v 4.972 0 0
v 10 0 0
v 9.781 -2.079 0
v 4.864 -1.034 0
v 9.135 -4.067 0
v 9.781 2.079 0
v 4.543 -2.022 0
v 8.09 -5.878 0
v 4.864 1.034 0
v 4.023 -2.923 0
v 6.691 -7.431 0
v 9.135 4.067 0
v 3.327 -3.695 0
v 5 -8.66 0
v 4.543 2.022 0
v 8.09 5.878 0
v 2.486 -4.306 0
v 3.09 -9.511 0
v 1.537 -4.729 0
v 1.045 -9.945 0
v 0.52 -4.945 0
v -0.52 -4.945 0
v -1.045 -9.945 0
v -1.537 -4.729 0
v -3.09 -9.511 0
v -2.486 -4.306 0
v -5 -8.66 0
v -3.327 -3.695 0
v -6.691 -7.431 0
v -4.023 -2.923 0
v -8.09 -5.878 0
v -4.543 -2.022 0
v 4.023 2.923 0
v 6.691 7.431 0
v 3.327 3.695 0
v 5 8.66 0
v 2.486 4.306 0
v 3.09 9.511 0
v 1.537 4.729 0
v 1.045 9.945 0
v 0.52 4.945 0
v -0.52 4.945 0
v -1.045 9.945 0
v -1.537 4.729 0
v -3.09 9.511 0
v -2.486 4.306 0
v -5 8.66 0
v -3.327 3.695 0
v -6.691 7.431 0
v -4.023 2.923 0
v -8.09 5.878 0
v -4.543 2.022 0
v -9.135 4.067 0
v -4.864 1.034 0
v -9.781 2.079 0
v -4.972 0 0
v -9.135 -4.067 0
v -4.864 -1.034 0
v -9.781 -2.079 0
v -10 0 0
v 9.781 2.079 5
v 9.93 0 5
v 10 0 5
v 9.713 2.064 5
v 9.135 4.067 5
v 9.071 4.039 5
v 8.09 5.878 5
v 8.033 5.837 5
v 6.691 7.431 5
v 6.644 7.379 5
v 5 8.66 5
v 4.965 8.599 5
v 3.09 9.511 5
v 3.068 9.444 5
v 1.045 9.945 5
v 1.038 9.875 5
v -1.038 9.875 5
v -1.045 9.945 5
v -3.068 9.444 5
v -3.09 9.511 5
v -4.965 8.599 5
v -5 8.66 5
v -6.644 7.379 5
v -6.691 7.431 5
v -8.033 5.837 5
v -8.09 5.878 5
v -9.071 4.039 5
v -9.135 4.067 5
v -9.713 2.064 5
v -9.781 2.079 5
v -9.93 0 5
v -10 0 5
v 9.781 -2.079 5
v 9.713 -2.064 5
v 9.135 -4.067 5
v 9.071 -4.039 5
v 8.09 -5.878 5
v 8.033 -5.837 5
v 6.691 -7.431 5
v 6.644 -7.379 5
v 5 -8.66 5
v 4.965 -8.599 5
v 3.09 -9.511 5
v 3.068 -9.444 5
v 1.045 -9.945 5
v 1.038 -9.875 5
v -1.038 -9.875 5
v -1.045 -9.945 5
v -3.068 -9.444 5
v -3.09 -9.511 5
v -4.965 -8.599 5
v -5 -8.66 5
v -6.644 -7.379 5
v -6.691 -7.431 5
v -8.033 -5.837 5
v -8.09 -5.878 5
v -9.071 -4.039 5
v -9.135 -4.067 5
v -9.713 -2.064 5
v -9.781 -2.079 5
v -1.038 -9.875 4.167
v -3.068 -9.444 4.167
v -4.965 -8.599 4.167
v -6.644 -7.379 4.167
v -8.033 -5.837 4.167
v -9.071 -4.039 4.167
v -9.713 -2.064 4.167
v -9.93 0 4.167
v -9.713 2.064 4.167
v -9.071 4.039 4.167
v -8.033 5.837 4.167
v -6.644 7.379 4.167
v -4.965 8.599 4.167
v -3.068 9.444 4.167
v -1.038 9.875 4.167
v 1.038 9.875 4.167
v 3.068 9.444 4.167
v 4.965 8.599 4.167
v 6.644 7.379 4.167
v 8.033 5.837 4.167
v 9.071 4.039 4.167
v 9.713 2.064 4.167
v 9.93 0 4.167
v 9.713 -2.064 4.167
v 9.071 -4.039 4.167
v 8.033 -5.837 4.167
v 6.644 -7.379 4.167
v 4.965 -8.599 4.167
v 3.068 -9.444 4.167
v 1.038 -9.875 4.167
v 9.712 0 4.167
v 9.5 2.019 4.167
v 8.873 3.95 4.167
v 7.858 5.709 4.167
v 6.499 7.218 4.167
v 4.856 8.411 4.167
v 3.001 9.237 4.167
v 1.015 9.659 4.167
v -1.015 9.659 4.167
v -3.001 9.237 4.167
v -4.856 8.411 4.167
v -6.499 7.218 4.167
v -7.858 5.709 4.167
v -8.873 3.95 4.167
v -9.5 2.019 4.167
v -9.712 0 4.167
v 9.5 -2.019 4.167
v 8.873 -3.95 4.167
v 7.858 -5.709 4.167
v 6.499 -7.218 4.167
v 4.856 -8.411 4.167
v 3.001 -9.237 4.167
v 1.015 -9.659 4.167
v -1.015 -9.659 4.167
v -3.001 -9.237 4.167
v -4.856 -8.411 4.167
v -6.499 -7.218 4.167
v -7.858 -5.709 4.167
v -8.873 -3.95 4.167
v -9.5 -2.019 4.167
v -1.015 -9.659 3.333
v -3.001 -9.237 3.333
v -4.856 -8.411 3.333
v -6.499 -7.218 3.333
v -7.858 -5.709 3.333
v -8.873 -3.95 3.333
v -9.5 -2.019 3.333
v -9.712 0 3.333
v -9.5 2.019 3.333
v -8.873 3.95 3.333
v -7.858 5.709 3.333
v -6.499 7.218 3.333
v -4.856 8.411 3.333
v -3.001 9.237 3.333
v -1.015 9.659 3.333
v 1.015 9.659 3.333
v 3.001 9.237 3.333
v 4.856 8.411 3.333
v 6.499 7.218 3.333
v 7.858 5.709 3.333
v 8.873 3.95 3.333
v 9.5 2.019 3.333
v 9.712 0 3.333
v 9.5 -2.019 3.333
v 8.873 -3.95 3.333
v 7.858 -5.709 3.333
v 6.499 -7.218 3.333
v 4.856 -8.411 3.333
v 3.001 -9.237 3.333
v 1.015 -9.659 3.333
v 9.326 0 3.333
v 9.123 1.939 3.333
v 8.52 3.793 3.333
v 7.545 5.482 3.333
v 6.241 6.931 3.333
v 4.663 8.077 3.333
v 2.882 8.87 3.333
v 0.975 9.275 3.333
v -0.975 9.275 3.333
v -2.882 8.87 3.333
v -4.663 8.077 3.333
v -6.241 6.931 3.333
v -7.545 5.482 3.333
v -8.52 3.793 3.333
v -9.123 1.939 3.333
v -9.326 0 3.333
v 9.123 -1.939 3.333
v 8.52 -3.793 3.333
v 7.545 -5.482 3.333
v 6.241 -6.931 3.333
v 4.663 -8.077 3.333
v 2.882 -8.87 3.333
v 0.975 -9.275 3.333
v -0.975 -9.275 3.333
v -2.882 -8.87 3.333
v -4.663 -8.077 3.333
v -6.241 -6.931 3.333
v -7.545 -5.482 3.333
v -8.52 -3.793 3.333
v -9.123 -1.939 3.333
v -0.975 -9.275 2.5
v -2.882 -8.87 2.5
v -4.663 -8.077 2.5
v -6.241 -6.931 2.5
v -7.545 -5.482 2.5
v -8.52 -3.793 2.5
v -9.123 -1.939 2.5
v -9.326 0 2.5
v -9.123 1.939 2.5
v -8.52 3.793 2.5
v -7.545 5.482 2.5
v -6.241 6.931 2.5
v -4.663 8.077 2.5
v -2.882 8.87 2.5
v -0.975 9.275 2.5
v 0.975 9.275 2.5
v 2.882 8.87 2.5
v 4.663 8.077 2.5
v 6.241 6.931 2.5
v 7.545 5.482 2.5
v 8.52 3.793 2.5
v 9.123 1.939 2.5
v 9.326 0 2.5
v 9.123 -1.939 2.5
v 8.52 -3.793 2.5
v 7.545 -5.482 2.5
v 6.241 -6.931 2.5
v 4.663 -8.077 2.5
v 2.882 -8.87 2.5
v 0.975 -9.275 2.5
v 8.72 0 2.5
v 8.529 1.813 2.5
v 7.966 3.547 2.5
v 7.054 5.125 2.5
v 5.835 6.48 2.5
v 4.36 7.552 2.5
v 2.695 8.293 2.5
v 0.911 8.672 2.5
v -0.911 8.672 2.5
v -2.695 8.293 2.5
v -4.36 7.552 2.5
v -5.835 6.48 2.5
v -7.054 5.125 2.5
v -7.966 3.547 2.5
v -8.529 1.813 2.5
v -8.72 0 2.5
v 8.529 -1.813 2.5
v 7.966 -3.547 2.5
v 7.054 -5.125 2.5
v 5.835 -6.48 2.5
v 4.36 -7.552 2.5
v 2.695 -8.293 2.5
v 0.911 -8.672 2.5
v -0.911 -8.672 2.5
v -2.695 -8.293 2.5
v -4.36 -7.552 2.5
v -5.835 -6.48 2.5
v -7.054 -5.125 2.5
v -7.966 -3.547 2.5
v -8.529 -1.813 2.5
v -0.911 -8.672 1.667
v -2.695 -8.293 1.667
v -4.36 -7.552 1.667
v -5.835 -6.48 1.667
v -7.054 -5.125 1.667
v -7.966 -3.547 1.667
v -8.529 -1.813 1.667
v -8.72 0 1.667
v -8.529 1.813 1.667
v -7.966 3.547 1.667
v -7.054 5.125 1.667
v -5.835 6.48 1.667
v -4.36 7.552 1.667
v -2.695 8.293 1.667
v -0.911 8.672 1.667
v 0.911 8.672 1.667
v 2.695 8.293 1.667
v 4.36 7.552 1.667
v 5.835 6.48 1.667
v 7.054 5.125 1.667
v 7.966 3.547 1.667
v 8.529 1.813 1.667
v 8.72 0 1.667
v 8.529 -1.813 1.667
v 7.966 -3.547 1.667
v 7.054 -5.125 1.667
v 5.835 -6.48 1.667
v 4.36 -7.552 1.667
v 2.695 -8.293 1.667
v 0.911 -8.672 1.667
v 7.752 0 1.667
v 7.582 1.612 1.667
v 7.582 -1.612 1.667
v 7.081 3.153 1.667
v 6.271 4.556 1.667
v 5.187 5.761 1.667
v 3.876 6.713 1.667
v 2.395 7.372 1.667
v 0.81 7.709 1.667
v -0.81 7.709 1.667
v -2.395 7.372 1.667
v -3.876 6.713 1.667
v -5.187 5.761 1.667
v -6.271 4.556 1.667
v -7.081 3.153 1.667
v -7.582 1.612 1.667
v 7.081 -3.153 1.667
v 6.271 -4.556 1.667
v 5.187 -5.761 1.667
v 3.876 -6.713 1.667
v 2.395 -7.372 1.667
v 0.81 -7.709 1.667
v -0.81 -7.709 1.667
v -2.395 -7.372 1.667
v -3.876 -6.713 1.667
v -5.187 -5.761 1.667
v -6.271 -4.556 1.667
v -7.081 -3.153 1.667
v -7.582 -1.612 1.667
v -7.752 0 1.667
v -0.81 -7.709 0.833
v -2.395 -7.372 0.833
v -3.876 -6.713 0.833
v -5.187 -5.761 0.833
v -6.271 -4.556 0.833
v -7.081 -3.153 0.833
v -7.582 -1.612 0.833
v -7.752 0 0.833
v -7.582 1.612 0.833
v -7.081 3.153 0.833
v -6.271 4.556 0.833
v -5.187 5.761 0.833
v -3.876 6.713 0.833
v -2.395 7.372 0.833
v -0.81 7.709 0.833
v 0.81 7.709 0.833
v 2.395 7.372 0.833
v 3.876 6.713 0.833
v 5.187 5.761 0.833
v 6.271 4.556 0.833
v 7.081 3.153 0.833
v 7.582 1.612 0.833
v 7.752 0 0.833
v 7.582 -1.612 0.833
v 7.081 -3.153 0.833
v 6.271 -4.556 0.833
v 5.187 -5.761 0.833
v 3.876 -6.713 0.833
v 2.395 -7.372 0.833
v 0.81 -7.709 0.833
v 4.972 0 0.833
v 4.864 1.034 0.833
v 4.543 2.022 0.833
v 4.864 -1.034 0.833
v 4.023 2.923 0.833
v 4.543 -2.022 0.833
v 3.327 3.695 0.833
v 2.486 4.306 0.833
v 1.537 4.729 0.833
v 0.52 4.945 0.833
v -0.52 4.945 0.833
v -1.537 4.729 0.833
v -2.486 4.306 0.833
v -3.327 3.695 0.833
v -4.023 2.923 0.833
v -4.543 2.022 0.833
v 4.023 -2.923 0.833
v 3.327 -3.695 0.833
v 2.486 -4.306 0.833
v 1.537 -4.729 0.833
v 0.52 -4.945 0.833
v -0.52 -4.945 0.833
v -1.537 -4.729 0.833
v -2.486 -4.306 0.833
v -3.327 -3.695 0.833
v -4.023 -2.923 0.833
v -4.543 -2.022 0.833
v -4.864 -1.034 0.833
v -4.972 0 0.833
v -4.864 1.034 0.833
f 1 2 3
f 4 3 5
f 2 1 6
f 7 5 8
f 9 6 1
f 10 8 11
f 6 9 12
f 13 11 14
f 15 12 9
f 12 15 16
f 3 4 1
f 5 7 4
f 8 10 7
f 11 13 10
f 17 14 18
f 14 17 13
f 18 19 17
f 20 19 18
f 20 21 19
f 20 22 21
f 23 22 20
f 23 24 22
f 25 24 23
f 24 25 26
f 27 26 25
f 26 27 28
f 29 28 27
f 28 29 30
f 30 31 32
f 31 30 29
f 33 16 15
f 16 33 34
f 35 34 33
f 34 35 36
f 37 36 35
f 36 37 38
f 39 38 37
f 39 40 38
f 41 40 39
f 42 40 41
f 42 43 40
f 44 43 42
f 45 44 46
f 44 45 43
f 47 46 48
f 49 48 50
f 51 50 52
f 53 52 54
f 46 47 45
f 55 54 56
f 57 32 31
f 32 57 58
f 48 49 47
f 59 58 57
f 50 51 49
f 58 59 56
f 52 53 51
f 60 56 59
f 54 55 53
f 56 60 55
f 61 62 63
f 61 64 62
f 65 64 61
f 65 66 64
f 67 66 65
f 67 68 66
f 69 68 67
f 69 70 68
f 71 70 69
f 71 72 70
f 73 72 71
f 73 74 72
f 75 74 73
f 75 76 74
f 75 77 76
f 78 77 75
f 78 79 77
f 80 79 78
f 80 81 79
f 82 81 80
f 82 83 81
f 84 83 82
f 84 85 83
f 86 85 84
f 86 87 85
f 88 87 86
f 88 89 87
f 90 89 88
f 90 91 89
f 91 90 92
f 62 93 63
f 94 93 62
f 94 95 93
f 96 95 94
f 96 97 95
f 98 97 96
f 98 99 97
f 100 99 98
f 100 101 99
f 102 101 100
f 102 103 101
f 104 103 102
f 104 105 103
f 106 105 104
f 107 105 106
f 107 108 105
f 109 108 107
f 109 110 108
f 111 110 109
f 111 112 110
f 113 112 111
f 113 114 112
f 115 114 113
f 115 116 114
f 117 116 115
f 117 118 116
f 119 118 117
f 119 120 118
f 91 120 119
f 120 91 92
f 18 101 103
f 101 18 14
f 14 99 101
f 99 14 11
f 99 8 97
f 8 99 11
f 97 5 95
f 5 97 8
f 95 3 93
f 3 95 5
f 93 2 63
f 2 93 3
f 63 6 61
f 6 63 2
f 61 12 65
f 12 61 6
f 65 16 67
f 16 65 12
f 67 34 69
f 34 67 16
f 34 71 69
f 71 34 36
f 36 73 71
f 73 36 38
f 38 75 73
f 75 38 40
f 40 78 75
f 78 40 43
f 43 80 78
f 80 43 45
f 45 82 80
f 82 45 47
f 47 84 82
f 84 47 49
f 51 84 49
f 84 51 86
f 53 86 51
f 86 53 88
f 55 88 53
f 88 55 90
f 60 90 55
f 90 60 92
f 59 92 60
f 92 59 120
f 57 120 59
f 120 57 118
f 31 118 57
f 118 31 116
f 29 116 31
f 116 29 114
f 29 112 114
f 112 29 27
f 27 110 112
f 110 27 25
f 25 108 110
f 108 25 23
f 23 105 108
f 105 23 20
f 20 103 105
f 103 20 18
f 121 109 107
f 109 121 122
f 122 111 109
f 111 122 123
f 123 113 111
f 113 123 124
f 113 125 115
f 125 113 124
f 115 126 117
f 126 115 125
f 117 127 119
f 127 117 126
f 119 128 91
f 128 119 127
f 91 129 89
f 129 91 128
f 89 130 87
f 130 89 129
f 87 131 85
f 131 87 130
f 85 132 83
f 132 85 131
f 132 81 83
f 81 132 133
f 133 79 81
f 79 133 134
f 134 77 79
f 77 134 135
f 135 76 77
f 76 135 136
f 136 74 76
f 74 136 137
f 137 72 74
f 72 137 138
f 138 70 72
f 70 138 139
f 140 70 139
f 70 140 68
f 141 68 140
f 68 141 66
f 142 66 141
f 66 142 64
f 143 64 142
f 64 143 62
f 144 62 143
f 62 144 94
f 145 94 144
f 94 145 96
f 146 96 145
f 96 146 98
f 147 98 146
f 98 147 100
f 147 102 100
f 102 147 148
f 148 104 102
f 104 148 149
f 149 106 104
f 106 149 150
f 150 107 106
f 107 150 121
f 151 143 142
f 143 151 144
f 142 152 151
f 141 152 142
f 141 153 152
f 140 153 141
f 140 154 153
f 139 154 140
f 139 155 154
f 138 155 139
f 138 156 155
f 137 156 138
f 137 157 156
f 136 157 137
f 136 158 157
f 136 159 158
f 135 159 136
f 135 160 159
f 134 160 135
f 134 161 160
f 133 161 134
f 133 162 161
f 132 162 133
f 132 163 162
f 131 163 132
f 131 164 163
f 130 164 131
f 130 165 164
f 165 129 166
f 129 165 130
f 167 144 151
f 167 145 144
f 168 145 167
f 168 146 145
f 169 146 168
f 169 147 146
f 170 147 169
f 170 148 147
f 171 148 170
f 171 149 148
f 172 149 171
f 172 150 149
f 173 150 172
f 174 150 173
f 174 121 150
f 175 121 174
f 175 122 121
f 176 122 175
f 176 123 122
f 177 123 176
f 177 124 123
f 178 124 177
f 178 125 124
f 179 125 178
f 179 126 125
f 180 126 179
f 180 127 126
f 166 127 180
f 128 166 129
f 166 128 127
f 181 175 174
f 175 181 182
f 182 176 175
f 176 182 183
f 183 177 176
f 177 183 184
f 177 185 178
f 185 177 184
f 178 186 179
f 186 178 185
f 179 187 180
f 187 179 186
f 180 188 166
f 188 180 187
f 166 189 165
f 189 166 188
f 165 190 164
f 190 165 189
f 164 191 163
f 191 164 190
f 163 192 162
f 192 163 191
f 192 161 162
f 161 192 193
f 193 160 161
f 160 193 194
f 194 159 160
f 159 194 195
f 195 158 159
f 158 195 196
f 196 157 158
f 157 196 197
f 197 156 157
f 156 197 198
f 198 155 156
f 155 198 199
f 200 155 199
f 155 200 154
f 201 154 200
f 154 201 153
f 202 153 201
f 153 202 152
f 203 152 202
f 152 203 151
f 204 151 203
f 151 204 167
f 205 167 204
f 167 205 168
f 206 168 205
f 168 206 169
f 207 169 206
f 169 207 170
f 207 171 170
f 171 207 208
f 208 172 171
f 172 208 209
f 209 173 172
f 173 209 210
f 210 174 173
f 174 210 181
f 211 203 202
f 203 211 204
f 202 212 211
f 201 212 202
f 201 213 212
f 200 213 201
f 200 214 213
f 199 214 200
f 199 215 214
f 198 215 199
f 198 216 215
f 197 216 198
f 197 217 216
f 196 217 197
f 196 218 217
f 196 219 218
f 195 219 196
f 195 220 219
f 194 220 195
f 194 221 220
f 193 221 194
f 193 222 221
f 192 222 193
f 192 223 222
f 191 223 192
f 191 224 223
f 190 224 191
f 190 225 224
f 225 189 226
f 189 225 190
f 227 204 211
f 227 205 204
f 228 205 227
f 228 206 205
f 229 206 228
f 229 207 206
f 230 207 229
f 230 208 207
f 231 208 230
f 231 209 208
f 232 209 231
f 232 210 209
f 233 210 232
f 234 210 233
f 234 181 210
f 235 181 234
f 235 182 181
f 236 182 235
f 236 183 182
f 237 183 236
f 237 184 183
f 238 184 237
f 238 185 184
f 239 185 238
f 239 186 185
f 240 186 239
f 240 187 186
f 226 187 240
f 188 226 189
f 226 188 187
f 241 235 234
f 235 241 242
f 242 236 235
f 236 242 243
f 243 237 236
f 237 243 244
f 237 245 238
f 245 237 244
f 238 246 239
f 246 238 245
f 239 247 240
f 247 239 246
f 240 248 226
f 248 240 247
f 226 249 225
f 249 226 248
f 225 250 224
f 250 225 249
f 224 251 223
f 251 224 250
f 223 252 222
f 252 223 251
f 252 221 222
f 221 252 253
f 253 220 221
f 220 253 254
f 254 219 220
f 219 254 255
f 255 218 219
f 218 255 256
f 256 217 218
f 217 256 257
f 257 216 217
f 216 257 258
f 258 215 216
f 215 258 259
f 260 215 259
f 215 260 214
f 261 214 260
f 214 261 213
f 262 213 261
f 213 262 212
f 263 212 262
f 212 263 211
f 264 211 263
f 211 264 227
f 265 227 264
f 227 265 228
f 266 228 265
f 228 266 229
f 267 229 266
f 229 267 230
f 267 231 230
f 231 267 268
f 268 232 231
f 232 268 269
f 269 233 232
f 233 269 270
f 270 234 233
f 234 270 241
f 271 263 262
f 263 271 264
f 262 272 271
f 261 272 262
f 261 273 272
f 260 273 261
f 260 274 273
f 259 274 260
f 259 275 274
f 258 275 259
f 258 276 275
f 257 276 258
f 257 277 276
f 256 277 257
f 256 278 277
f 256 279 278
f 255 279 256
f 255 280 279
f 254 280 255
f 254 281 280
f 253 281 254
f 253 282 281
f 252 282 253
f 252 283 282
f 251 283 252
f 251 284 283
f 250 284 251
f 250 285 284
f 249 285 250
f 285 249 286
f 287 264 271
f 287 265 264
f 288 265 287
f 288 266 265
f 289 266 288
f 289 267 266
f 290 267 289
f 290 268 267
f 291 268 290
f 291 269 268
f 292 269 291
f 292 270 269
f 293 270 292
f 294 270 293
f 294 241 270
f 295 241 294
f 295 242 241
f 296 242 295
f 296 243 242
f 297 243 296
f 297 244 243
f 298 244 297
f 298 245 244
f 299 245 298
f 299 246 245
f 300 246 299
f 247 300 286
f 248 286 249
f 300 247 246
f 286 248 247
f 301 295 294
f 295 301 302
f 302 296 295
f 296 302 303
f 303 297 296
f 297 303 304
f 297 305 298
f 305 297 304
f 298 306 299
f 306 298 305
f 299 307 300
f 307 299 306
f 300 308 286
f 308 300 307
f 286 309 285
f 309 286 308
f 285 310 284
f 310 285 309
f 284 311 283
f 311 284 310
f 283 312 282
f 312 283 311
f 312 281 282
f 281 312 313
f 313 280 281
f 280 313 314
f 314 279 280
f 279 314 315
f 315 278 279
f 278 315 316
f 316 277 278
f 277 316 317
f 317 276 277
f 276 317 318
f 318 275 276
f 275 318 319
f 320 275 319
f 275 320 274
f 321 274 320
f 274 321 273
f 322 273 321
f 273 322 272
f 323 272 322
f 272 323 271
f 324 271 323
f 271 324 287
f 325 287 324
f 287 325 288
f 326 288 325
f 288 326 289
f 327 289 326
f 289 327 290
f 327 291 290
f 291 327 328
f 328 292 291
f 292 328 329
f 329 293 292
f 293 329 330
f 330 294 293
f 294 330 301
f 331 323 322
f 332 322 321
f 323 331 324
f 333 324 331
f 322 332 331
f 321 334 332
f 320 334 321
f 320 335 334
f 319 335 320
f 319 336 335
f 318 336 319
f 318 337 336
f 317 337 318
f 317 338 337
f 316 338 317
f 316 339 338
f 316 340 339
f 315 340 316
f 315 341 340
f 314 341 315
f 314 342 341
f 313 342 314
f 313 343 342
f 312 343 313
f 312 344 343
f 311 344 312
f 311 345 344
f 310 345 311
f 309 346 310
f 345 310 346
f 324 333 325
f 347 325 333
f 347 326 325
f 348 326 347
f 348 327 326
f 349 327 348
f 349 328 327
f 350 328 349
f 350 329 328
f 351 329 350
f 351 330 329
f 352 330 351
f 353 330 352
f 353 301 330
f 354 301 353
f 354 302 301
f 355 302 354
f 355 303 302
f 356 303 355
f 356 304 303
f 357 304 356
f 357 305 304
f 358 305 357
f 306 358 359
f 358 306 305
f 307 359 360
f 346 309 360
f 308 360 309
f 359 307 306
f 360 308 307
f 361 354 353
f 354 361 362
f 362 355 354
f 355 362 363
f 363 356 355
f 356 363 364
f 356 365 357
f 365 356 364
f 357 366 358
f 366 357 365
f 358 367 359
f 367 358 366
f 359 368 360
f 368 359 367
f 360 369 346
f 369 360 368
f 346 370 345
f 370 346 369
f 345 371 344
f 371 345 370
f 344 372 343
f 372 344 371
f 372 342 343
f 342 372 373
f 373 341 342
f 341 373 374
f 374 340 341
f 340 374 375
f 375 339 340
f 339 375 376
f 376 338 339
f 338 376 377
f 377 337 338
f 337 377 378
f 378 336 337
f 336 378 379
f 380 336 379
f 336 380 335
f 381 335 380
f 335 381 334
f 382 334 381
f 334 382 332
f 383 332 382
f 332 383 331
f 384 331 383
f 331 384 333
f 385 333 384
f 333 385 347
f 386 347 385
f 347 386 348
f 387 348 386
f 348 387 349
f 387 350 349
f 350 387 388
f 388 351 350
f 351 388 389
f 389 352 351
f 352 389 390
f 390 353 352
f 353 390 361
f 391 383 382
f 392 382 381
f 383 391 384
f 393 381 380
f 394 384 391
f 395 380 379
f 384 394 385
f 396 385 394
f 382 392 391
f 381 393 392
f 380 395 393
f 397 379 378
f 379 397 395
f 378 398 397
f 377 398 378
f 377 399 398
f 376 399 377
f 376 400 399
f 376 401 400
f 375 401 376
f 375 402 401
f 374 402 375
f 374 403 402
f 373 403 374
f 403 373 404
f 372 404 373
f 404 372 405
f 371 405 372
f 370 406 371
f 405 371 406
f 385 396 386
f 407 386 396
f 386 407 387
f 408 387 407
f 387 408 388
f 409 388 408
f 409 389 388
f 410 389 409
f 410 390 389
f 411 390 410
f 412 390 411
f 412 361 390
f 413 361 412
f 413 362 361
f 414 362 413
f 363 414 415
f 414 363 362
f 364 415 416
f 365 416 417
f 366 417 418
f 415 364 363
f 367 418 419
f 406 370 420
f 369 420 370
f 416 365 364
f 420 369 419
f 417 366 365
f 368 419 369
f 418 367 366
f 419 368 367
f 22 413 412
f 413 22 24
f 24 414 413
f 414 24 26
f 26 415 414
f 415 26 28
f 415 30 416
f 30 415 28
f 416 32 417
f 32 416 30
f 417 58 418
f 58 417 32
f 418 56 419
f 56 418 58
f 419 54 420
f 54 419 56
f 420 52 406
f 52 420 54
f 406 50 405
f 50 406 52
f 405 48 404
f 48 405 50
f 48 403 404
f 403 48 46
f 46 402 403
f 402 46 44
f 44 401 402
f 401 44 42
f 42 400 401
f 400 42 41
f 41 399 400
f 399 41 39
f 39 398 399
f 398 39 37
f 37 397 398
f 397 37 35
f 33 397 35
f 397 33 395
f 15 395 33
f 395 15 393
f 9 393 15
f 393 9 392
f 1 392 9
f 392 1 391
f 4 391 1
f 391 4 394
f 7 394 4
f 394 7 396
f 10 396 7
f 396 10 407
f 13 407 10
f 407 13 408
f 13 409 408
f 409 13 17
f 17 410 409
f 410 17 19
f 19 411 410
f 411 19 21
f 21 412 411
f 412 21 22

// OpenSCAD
union() {
    union() {
        linear_extrude(height=5) {
            difference() {
                offset(r=0) {
                    circle(r=10);
                };
                offset(r=-0.06993351408365323) {
                    circle(r=10);
                };
            };
        };
        linear_extrude(height=4.166666666666667) {
            difference() {
                offset(r=-0.06993351408365323) {
                    circle(r=10);
                };
                offset(r=-0.2859547920896832) {
                    circle(r=10);
                };
            };
        };
        linear_extrude(height=3.333333333333333) {
            difference() {
                offset(r=-0.2859547920896832) {
                    circle(r=10);
                };
                offset(r=-0.669872981077807) {
                    circle(r=10);
                };
            };
        };
        linear_extrude(height=2.5) {
            difference() {
                offset(r=-0.669872981077807) {
                    circle(r=10);
                };
                offset(r=-1.2732200375003506) {
                    circle(r=10);
                };
            };
        };
        linear_extrude(height=1.6666666666666665) {
            difference() {
                offset(r=-1.2732200375003506) {
                    circle(r=10);
                };
                offset(r=-2.236146008037167) {
                    circle(r=10);
                };
            };
        };
        linear_extrude(height=0.833333333333333) {
            difference() {
                offset(r=-2.236146008037167) {
                    circle(r=10);
                };
                offset(r=-5) {
                    circle(r=10);
                };
            };
        };
    };
    %difference() {
        translate(v=[0, 0, 2.5]) {
            cube(size=[25, 25, 5], center=true);
        };
        cylinder(r=10, h=20, center=true);
    };
};
